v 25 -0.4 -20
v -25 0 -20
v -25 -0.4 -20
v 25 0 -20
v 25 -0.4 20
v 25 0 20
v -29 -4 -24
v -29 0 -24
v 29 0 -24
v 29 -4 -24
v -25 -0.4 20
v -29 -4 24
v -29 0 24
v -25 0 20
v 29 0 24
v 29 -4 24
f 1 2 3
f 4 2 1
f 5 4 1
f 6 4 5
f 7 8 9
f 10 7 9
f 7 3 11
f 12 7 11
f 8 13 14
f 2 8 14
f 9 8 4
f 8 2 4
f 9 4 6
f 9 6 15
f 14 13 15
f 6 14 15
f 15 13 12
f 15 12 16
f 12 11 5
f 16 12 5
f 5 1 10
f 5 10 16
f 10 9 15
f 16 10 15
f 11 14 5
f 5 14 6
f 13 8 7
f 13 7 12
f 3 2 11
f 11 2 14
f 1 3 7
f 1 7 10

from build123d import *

# Parameters (mm, degrees)
F1_W     = 58
F1_H     = 48
F1_W_2   = 50
F1_H_2   = 40
F2_DEPTH = 4
F3_SIZE2 = 3.59999
F3_SIZE  = 3.99999


# Not quite as in the source:
# - a fillet or chamfer is up to 0.001 mm smaller than in the source, because OpenCascade refuses the exact size


with BuildPart() as f2:
    # F1 (on Front) → F2 (new body)
    with BuildSketch(Plane.XZ):
        Rectangle(F1_W, F1_H)
        Rectangle(F1_W_2, F1_H_2, mode=Mode.SUBTRACT)
    extrude(amount=F2_DEPTH)

    # F3 (size 4 and 3.6 in the source; OpenCascade refuses exactly that, so slightly less here)
    f3_edges = [f2.edges().sort_by_distance(p)[0] for p in [
        (-25, -4, 0),
        (0, -4, 20),
        (25, -4, 0),
        (0, -4, -20),
    ]]
    f3_side = f2.faces().sort_by_distance((28.247139, -4, 0))[0]
    chamfer(f3_edges, length=F3_SIZE, length2=F3_SIZE2, reference=f3_side)


solid = f2.part
